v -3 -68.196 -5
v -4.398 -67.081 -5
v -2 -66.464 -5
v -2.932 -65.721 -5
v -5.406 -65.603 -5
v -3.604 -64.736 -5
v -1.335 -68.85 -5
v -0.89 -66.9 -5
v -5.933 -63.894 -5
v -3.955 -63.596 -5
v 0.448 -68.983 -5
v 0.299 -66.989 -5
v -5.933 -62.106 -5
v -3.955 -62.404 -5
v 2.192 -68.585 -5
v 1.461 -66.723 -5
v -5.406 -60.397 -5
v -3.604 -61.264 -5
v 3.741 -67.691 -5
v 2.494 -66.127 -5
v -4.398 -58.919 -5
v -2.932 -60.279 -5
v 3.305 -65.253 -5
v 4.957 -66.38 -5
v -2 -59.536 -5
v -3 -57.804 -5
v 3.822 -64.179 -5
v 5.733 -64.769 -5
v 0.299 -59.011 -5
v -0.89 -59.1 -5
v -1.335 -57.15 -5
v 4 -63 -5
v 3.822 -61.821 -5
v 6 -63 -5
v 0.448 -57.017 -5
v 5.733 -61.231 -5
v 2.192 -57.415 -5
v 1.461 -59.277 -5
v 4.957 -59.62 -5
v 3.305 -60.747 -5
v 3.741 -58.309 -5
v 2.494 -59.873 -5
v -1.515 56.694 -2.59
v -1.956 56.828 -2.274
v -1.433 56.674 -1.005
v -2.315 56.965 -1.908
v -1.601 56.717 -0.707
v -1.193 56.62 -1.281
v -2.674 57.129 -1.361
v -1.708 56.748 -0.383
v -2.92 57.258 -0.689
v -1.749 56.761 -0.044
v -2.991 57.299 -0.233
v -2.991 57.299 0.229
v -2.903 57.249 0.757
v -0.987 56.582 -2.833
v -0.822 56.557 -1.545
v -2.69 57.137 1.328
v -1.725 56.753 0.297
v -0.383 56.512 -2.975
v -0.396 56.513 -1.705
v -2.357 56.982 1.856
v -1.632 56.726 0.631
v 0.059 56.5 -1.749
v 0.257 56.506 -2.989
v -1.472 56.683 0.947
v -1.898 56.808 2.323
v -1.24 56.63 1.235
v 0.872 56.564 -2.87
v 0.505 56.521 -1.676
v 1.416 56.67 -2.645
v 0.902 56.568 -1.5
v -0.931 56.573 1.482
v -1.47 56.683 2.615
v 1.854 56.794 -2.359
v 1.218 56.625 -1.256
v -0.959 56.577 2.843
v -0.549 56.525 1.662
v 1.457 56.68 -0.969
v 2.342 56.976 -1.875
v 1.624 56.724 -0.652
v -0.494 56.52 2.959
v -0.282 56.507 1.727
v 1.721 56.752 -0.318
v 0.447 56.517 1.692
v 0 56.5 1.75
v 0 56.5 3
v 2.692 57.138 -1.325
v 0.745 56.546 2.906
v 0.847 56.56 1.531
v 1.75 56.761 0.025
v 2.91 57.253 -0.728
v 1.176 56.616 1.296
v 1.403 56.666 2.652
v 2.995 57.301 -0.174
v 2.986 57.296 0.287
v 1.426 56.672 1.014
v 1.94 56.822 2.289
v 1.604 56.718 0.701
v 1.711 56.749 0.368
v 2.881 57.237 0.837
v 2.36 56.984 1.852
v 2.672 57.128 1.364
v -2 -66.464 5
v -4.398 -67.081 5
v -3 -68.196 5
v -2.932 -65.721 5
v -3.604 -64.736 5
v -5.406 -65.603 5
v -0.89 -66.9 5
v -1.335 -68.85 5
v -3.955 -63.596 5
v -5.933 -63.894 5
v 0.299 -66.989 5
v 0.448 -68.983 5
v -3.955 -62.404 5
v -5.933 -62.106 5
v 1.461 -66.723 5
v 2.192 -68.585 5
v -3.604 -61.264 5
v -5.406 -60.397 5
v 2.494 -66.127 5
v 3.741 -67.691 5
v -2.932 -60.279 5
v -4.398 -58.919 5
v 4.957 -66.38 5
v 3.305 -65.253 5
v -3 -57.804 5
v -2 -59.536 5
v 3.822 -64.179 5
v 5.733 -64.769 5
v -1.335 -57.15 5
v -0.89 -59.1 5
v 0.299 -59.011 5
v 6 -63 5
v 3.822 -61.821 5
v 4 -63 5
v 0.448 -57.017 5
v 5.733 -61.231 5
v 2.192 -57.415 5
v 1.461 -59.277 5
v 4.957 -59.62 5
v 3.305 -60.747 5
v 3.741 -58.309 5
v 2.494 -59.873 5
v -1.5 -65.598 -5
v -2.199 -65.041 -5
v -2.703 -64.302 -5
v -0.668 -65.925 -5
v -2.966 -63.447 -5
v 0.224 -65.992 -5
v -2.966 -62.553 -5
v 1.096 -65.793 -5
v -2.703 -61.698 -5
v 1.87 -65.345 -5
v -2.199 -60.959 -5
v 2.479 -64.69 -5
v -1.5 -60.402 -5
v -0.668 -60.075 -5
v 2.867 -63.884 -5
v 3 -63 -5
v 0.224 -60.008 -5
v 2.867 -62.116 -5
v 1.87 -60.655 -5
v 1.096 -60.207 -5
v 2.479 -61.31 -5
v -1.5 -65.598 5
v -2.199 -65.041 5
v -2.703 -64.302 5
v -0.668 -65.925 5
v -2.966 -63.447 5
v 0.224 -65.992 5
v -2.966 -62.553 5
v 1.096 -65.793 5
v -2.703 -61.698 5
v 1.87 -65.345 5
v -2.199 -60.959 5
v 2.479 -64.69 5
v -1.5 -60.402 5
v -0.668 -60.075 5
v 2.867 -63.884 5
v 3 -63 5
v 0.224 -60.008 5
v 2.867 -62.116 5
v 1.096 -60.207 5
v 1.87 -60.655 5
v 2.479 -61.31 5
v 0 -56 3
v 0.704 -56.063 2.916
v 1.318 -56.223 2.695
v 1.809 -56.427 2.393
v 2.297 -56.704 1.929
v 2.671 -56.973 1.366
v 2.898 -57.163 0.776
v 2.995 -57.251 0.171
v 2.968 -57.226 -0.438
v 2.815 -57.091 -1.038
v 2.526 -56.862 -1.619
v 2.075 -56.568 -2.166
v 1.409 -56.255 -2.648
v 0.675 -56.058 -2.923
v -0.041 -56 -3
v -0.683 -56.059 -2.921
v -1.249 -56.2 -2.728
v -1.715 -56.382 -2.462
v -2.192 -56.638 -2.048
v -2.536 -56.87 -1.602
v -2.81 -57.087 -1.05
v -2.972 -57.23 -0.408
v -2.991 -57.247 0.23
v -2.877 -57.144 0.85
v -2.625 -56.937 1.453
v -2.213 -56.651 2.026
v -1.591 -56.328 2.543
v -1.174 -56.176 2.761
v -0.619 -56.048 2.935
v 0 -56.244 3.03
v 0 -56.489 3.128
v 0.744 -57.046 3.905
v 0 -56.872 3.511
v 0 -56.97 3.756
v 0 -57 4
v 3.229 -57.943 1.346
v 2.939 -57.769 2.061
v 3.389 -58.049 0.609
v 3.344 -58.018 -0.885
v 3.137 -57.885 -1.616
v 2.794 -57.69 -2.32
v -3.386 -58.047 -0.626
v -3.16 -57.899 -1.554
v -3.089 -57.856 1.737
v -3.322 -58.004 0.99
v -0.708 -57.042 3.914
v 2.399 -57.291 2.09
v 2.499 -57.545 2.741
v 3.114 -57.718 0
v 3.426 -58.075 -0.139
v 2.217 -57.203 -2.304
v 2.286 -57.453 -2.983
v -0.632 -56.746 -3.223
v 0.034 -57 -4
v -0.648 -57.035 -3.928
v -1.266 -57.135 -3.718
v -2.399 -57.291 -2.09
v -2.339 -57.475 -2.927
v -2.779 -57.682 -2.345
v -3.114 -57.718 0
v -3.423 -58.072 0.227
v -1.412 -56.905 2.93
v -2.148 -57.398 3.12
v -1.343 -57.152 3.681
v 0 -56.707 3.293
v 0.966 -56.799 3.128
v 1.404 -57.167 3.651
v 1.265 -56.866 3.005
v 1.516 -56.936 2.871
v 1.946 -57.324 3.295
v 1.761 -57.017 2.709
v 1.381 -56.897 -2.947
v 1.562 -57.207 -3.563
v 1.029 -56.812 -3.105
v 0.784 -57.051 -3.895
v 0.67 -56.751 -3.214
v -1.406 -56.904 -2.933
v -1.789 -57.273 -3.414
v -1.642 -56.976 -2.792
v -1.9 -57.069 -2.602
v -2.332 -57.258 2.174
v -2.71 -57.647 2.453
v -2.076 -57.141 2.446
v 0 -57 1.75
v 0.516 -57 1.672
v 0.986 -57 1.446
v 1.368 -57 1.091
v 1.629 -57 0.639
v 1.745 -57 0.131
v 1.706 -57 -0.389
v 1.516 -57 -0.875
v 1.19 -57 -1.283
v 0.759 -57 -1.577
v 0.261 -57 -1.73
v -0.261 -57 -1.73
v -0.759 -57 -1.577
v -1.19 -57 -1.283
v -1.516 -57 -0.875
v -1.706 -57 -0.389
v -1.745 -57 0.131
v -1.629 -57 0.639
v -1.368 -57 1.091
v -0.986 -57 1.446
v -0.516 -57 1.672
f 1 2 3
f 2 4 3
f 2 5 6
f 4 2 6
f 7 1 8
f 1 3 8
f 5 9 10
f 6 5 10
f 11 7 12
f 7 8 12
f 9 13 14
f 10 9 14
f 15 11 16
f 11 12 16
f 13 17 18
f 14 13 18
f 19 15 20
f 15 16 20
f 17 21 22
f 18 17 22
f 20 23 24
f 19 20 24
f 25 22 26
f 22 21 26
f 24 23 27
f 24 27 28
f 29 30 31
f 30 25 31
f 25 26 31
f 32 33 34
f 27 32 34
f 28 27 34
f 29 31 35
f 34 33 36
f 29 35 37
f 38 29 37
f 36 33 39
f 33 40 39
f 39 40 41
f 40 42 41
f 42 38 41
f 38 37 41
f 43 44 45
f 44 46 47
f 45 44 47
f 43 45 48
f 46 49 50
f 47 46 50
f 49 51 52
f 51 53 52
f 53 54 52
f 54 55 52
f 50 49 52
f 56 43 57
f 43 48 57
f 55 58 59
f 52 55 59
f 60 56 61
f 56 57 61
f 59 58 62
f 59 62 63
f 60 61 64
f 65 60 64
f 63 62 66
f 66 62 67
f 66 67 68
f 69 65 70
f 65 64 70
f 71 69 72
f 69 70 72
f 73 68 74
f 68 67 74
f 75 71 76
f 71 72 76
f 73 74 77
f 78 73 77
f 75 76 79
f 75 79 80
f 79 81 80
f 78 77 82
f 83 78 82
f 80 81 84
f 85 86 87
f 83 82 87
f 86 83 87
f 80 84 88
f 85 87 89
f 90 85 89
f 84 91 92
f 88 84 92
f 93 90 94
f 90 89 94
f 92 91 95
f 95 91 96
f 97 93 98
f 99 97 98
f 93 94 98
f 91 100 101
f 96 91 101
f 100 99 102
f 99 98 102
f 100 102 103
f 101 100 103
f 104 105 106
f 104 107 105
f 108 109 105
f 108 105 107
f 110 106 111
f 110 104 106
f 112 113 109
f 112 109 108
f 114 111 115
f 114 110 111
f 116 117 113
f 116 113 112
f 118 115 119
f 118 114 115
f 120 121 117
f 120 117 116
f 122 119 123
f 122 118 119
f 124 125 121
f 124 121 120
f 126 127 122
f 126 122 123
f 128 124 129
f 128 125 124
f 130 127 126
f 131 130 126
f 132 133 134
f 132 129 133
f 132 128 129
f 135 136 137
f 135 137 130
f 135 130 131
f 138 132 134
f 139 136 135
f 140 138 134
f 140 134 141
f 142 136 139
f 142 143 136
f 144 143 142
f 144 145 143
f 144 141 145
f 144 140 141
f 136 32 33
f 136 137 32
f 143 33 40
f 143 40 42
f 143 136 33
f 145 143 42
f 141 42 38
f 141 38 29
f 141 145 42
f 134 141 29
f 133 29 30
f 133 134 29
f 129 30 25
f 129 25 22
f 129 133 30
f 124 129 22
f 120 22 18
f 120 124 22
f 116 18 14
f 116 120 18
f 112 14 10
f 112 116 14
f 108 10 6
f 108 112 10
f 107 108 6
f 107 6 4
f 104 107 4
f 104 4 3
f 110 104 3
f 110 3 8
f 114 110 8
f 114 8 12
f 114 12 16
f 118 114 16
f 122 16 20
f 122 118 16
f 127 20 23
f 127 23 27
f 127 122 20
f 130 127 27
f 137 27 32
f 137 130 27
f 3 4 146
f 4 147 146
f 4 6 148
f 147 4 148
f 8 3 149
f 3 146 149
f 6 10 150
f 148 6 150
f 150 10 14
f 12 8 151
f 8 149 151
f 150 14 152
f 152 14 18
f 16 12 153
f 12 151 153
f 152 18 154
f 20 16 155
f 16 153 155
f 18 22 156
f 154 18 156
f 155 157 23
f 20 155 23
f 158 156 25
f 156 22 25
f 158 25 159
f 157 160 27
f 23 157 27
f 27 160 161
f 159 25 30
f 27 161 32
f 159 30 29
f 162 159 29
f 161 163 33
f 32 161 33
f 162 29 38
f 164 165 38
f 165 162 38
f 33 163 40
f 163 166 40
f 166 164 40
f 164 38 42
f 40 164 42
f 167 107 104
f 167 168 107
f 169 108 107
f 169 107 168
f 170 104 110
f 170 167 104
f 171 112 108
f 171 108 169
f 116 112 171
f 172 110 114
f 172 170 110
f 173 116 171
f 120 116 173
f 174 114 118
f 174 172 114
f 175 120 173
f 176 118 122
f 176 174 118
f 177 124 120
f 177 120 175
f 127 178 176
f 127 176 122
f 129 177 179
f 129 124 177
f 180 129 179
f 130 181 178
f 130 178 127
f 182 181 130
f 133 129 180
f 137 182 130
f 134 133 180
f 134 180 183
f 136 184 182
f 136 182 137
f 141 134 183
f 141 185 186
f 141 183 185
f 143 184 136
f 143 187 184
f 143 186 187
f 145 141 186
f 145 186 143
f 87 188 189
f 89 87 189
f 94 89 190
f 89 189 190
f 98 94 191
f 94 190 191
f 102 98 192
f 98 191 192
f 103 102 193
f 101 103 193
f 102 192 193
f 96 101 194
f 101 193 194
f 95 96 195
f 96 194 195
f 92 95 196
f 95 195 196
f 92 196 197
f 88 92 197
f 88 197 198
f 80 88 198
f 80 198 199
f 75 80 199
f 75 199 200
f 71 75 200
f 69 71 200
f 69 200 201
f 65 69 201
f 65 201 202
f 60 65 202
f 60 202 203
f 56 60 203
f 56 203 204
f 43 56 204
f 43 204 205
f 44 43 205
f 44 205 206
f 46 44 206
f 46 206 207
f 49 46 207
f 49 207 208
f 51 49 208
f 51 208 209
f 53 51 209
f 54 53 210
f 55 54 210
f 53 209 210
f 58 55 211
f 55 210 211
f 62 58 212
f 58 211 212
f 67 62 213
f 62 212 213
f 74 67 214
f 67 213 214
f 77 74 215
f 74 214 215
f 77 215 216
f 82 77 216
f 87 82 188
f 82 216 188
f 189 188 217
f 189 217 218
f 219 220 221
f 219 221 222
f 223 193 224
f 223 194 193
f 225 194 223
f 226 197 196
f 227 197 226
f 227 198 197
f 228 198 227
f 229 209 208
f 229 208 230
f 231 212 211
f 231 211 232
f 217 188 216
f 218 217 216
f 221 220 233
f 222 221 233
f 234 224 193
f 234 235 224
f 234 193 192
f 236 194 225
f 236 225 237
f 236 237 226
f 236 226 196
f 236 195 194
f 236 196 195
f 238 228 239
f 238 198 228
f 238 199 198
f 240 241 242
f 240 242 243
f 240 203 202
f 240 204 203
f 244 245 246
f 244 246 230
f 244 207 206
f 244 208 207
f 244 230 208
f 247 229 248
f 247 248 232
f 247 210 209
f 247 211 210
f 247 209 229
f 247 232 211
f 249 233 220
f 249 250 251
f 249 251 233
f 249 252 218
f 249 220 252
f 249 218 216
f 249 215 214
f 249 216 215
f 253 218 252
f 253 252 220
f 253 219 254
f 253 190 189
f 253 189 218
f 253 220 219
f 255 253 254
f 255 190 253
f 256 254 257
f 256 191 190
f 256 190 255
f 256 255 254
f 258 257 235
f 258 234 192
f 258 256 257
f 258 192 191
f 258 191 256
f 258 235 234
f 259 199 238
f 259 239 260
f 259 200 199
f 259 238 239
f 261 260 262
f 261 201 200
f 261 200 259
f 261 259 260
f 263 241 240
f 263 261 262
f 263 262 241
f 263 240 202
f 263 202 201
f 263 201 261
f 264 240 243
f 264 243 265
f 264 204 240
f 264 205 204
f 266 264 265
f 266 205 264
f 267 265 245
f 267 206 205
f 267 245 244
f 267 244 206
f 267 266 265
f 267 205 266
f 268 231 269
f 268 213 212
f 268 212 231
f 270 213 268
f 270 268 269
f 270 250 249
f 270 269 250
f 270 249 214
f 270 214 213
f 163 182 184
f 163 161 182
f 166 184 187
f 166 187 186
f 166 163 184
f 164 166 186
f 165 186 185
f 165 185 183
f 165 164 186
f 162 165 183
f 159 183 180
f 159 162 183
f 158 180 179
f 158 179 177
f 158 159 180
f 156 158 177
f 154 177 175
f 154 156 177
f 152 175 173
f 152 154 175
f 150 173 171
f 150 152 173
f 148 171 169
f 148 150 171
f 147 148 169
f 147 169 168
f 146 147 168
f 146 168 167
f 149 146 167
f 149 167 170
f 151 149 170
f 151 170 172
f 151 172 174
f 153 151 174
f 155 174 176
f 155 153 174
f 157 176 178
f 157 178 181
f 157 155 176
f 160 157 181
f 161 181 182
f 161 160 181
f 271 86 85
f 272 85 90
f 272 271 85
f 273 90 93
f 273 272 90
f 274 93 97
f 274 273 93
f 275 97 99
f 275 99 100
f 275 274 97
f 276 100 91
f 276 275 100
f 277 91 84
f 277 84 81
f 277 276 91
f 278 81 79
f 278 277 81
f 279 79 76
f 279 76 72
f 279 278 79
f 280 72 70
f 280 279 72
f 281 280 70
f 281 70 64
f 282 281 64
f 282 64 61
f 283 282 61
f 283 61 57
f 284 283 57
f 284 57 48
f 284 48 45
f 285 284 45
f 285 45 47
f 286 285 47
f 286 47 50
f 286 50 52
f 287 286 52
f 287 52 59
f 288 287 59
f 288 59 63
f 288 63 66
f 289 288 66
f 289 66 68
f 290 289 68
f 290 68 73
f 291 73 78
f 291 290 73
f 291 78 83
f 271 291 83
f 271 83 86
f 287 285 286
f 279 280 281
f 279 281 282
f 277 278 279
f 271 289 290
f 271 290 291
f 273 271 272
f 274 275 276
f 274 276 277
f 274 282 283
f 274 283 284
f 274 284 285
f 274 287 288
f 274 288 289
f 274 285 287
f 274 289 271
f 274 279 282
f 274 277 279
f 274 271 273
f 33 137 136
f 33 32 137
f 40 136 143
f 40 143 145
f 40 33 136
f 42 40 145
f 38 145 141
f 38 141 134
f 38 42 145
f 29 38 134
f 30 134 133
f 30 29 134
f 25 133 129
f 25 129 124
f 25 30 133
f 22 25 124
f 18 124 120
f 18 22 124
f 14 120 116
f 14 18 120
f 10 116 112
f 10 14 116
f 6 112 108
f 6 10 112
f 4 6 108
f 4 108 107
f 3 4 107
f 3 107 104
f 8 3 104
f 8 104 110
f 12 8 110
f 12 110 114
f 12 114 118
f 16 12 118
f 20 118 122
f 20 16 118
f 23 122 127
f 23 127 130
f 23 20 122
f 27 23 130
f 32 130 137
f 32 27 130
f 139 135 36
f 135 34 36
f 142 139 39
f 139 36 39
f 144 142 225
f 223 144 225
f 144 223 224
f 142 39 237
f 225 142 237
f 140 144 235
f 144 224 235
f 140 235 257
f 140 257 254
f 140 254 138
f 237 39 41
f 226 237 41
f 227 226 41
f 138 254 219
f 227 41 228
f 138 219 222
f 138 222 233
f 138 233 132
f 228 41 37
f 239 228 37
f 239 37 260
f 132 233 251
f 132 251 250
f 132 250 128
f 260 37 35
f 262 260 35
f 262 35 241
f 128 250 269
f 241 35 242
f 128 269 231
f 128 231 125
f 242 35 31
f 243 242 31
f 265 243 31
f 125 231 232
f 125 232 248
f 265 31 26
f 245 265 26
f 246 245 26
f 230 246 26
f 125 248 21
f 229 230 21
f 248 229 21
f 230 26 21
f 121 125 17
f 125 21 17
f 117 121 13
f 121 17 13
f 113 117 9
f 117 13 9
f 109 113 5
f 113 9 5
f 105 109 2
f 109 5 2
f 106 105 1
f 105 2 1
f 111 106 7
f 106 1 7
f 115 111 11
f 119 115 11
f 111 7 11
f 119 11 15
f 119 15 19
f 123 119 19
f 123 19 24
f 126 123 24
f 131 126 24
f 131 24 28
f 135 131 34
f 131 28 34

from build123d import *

# Parameters (mm, degrees)
BOSS_EXTRUDE1_DEPTH      = 57.5
BOSS_EXTRUDE1_DEPTH_BACK = 58
SKETCH1_R                = 3
SKETCH2_R                = 6
SKETCH2_R_2              = 4
SKETCH2_R_3              = 3
BOSS_EXTRUDE2_DEPTH      = 5
SKETCH3_R                = 4
SKETCH3_R_2              = 3
BOSS_EXTRUDE3_DEPTH      = 5
FILLET1_R                = 1
SKETCH5_R                = 6
CUT_EXTRUDE2_DEPTH       = 10
CUT_EXTRUDE3_DEPTH       = 58
CUT_EXTRUDE3_DEPTH_BACK  = 57
SKETCH6_R                = 1.75


with BuildPart() as part:
    # Sketch1 → Boss-Extrude1 (new, two sides: drawn at the far end of the back side and taken through both)
    with BuildSketch(Plane(origin=(0, 0, 0), x_dir=(1, 0, 0), z_dir=(0, 1, 0)).offset(-BOSS_EXTRUDE1_DEPTH_BACK)):
        with Locations(Location((0, 0, 0), (0, 0, 270))):
            Circle(SKETCH1_R)
    extrude(amount=BOSS_EXTRUDE1_DEPTH + BOSS_EXTRUDE1_DEPTH_BACK)

    # Sketch2 → Boss-Extrude2 (add, symmetric)
    # profile 1 of 2: a face of its own
    with BuildSketch(Plane.XY):
        with Locations((0, -63)):
            Circle(SKETCH2_R)
        with Locations((0, -63)):
            Circle(SKETCH2_R_2, mode=Mode.SUBTRACT)
    # profile 2 of 2: a face of its own
    with BuildSketch(Plane.XY):
        with Locations((0, 62.5)):
            Circle(SKETCH2_R)
        with Locations((0, 62.5)):
            Circle(SKETCH2_R_3, mode=Mode.SUBTRACT)
    extrude(amount=BOSS_EXTRUDE2_DEPTH, both=True)

    # Fillet1
    fillet1_edges = [part.edges().sort_by_distance(p)[0] for p in [
        (0, -57, -3.000000001),
    ]]
    fillet(fillet1_edges, radius=FILLET1_R)

    # Sketch5 → Cut-Extrude2 (cut)
    with BuildSketch(Plane.XY.offset(5)):
        with Locations((0, 62.5)):
            Circle(SKETCH5_R)
    extrude(amount=-CUT_EXTRUDE2_DEPTH, mode=Mode.SUBTRACT)

    # Sketch6 → Cut-Extrude3 (cut, two sides: drawn at the far end of the back side and taken through both)
    with BuildSketch(Plane(origin=(0, 0, 0), x_dir=(1, 0, 0), z_dir=(0, 1, 0)).offset(-CUT_EXTRUDE3_DEPTH_BACK)):
        with Locations(Location((0, 0, 0), (0, 0, 270))):
            Circle(SKETCH6_R)
    extrude(amount=CUT_EXTRUDE3_DEPTH + CUT_EXTRUDE3_DEPTH_BACK, mode=Mode.SUBTRACT)


with BuildPart() as body_2:
    # Sketch3 → Boss-Extrude3 (new, symmetric)
    with BuildSketch(Plane.XY):
        with Locations((0, -63)):
            Circle(SKETCH3_R)
        with Locations((0, -63)):
            Circle(SKETCH3_R_2, mode=Mode.SUBTRACT)
    extrude(amount=BOSS_EXTRUDE3_DEPTH, both=True)


solid = Compound([part.part, body_2.part])
